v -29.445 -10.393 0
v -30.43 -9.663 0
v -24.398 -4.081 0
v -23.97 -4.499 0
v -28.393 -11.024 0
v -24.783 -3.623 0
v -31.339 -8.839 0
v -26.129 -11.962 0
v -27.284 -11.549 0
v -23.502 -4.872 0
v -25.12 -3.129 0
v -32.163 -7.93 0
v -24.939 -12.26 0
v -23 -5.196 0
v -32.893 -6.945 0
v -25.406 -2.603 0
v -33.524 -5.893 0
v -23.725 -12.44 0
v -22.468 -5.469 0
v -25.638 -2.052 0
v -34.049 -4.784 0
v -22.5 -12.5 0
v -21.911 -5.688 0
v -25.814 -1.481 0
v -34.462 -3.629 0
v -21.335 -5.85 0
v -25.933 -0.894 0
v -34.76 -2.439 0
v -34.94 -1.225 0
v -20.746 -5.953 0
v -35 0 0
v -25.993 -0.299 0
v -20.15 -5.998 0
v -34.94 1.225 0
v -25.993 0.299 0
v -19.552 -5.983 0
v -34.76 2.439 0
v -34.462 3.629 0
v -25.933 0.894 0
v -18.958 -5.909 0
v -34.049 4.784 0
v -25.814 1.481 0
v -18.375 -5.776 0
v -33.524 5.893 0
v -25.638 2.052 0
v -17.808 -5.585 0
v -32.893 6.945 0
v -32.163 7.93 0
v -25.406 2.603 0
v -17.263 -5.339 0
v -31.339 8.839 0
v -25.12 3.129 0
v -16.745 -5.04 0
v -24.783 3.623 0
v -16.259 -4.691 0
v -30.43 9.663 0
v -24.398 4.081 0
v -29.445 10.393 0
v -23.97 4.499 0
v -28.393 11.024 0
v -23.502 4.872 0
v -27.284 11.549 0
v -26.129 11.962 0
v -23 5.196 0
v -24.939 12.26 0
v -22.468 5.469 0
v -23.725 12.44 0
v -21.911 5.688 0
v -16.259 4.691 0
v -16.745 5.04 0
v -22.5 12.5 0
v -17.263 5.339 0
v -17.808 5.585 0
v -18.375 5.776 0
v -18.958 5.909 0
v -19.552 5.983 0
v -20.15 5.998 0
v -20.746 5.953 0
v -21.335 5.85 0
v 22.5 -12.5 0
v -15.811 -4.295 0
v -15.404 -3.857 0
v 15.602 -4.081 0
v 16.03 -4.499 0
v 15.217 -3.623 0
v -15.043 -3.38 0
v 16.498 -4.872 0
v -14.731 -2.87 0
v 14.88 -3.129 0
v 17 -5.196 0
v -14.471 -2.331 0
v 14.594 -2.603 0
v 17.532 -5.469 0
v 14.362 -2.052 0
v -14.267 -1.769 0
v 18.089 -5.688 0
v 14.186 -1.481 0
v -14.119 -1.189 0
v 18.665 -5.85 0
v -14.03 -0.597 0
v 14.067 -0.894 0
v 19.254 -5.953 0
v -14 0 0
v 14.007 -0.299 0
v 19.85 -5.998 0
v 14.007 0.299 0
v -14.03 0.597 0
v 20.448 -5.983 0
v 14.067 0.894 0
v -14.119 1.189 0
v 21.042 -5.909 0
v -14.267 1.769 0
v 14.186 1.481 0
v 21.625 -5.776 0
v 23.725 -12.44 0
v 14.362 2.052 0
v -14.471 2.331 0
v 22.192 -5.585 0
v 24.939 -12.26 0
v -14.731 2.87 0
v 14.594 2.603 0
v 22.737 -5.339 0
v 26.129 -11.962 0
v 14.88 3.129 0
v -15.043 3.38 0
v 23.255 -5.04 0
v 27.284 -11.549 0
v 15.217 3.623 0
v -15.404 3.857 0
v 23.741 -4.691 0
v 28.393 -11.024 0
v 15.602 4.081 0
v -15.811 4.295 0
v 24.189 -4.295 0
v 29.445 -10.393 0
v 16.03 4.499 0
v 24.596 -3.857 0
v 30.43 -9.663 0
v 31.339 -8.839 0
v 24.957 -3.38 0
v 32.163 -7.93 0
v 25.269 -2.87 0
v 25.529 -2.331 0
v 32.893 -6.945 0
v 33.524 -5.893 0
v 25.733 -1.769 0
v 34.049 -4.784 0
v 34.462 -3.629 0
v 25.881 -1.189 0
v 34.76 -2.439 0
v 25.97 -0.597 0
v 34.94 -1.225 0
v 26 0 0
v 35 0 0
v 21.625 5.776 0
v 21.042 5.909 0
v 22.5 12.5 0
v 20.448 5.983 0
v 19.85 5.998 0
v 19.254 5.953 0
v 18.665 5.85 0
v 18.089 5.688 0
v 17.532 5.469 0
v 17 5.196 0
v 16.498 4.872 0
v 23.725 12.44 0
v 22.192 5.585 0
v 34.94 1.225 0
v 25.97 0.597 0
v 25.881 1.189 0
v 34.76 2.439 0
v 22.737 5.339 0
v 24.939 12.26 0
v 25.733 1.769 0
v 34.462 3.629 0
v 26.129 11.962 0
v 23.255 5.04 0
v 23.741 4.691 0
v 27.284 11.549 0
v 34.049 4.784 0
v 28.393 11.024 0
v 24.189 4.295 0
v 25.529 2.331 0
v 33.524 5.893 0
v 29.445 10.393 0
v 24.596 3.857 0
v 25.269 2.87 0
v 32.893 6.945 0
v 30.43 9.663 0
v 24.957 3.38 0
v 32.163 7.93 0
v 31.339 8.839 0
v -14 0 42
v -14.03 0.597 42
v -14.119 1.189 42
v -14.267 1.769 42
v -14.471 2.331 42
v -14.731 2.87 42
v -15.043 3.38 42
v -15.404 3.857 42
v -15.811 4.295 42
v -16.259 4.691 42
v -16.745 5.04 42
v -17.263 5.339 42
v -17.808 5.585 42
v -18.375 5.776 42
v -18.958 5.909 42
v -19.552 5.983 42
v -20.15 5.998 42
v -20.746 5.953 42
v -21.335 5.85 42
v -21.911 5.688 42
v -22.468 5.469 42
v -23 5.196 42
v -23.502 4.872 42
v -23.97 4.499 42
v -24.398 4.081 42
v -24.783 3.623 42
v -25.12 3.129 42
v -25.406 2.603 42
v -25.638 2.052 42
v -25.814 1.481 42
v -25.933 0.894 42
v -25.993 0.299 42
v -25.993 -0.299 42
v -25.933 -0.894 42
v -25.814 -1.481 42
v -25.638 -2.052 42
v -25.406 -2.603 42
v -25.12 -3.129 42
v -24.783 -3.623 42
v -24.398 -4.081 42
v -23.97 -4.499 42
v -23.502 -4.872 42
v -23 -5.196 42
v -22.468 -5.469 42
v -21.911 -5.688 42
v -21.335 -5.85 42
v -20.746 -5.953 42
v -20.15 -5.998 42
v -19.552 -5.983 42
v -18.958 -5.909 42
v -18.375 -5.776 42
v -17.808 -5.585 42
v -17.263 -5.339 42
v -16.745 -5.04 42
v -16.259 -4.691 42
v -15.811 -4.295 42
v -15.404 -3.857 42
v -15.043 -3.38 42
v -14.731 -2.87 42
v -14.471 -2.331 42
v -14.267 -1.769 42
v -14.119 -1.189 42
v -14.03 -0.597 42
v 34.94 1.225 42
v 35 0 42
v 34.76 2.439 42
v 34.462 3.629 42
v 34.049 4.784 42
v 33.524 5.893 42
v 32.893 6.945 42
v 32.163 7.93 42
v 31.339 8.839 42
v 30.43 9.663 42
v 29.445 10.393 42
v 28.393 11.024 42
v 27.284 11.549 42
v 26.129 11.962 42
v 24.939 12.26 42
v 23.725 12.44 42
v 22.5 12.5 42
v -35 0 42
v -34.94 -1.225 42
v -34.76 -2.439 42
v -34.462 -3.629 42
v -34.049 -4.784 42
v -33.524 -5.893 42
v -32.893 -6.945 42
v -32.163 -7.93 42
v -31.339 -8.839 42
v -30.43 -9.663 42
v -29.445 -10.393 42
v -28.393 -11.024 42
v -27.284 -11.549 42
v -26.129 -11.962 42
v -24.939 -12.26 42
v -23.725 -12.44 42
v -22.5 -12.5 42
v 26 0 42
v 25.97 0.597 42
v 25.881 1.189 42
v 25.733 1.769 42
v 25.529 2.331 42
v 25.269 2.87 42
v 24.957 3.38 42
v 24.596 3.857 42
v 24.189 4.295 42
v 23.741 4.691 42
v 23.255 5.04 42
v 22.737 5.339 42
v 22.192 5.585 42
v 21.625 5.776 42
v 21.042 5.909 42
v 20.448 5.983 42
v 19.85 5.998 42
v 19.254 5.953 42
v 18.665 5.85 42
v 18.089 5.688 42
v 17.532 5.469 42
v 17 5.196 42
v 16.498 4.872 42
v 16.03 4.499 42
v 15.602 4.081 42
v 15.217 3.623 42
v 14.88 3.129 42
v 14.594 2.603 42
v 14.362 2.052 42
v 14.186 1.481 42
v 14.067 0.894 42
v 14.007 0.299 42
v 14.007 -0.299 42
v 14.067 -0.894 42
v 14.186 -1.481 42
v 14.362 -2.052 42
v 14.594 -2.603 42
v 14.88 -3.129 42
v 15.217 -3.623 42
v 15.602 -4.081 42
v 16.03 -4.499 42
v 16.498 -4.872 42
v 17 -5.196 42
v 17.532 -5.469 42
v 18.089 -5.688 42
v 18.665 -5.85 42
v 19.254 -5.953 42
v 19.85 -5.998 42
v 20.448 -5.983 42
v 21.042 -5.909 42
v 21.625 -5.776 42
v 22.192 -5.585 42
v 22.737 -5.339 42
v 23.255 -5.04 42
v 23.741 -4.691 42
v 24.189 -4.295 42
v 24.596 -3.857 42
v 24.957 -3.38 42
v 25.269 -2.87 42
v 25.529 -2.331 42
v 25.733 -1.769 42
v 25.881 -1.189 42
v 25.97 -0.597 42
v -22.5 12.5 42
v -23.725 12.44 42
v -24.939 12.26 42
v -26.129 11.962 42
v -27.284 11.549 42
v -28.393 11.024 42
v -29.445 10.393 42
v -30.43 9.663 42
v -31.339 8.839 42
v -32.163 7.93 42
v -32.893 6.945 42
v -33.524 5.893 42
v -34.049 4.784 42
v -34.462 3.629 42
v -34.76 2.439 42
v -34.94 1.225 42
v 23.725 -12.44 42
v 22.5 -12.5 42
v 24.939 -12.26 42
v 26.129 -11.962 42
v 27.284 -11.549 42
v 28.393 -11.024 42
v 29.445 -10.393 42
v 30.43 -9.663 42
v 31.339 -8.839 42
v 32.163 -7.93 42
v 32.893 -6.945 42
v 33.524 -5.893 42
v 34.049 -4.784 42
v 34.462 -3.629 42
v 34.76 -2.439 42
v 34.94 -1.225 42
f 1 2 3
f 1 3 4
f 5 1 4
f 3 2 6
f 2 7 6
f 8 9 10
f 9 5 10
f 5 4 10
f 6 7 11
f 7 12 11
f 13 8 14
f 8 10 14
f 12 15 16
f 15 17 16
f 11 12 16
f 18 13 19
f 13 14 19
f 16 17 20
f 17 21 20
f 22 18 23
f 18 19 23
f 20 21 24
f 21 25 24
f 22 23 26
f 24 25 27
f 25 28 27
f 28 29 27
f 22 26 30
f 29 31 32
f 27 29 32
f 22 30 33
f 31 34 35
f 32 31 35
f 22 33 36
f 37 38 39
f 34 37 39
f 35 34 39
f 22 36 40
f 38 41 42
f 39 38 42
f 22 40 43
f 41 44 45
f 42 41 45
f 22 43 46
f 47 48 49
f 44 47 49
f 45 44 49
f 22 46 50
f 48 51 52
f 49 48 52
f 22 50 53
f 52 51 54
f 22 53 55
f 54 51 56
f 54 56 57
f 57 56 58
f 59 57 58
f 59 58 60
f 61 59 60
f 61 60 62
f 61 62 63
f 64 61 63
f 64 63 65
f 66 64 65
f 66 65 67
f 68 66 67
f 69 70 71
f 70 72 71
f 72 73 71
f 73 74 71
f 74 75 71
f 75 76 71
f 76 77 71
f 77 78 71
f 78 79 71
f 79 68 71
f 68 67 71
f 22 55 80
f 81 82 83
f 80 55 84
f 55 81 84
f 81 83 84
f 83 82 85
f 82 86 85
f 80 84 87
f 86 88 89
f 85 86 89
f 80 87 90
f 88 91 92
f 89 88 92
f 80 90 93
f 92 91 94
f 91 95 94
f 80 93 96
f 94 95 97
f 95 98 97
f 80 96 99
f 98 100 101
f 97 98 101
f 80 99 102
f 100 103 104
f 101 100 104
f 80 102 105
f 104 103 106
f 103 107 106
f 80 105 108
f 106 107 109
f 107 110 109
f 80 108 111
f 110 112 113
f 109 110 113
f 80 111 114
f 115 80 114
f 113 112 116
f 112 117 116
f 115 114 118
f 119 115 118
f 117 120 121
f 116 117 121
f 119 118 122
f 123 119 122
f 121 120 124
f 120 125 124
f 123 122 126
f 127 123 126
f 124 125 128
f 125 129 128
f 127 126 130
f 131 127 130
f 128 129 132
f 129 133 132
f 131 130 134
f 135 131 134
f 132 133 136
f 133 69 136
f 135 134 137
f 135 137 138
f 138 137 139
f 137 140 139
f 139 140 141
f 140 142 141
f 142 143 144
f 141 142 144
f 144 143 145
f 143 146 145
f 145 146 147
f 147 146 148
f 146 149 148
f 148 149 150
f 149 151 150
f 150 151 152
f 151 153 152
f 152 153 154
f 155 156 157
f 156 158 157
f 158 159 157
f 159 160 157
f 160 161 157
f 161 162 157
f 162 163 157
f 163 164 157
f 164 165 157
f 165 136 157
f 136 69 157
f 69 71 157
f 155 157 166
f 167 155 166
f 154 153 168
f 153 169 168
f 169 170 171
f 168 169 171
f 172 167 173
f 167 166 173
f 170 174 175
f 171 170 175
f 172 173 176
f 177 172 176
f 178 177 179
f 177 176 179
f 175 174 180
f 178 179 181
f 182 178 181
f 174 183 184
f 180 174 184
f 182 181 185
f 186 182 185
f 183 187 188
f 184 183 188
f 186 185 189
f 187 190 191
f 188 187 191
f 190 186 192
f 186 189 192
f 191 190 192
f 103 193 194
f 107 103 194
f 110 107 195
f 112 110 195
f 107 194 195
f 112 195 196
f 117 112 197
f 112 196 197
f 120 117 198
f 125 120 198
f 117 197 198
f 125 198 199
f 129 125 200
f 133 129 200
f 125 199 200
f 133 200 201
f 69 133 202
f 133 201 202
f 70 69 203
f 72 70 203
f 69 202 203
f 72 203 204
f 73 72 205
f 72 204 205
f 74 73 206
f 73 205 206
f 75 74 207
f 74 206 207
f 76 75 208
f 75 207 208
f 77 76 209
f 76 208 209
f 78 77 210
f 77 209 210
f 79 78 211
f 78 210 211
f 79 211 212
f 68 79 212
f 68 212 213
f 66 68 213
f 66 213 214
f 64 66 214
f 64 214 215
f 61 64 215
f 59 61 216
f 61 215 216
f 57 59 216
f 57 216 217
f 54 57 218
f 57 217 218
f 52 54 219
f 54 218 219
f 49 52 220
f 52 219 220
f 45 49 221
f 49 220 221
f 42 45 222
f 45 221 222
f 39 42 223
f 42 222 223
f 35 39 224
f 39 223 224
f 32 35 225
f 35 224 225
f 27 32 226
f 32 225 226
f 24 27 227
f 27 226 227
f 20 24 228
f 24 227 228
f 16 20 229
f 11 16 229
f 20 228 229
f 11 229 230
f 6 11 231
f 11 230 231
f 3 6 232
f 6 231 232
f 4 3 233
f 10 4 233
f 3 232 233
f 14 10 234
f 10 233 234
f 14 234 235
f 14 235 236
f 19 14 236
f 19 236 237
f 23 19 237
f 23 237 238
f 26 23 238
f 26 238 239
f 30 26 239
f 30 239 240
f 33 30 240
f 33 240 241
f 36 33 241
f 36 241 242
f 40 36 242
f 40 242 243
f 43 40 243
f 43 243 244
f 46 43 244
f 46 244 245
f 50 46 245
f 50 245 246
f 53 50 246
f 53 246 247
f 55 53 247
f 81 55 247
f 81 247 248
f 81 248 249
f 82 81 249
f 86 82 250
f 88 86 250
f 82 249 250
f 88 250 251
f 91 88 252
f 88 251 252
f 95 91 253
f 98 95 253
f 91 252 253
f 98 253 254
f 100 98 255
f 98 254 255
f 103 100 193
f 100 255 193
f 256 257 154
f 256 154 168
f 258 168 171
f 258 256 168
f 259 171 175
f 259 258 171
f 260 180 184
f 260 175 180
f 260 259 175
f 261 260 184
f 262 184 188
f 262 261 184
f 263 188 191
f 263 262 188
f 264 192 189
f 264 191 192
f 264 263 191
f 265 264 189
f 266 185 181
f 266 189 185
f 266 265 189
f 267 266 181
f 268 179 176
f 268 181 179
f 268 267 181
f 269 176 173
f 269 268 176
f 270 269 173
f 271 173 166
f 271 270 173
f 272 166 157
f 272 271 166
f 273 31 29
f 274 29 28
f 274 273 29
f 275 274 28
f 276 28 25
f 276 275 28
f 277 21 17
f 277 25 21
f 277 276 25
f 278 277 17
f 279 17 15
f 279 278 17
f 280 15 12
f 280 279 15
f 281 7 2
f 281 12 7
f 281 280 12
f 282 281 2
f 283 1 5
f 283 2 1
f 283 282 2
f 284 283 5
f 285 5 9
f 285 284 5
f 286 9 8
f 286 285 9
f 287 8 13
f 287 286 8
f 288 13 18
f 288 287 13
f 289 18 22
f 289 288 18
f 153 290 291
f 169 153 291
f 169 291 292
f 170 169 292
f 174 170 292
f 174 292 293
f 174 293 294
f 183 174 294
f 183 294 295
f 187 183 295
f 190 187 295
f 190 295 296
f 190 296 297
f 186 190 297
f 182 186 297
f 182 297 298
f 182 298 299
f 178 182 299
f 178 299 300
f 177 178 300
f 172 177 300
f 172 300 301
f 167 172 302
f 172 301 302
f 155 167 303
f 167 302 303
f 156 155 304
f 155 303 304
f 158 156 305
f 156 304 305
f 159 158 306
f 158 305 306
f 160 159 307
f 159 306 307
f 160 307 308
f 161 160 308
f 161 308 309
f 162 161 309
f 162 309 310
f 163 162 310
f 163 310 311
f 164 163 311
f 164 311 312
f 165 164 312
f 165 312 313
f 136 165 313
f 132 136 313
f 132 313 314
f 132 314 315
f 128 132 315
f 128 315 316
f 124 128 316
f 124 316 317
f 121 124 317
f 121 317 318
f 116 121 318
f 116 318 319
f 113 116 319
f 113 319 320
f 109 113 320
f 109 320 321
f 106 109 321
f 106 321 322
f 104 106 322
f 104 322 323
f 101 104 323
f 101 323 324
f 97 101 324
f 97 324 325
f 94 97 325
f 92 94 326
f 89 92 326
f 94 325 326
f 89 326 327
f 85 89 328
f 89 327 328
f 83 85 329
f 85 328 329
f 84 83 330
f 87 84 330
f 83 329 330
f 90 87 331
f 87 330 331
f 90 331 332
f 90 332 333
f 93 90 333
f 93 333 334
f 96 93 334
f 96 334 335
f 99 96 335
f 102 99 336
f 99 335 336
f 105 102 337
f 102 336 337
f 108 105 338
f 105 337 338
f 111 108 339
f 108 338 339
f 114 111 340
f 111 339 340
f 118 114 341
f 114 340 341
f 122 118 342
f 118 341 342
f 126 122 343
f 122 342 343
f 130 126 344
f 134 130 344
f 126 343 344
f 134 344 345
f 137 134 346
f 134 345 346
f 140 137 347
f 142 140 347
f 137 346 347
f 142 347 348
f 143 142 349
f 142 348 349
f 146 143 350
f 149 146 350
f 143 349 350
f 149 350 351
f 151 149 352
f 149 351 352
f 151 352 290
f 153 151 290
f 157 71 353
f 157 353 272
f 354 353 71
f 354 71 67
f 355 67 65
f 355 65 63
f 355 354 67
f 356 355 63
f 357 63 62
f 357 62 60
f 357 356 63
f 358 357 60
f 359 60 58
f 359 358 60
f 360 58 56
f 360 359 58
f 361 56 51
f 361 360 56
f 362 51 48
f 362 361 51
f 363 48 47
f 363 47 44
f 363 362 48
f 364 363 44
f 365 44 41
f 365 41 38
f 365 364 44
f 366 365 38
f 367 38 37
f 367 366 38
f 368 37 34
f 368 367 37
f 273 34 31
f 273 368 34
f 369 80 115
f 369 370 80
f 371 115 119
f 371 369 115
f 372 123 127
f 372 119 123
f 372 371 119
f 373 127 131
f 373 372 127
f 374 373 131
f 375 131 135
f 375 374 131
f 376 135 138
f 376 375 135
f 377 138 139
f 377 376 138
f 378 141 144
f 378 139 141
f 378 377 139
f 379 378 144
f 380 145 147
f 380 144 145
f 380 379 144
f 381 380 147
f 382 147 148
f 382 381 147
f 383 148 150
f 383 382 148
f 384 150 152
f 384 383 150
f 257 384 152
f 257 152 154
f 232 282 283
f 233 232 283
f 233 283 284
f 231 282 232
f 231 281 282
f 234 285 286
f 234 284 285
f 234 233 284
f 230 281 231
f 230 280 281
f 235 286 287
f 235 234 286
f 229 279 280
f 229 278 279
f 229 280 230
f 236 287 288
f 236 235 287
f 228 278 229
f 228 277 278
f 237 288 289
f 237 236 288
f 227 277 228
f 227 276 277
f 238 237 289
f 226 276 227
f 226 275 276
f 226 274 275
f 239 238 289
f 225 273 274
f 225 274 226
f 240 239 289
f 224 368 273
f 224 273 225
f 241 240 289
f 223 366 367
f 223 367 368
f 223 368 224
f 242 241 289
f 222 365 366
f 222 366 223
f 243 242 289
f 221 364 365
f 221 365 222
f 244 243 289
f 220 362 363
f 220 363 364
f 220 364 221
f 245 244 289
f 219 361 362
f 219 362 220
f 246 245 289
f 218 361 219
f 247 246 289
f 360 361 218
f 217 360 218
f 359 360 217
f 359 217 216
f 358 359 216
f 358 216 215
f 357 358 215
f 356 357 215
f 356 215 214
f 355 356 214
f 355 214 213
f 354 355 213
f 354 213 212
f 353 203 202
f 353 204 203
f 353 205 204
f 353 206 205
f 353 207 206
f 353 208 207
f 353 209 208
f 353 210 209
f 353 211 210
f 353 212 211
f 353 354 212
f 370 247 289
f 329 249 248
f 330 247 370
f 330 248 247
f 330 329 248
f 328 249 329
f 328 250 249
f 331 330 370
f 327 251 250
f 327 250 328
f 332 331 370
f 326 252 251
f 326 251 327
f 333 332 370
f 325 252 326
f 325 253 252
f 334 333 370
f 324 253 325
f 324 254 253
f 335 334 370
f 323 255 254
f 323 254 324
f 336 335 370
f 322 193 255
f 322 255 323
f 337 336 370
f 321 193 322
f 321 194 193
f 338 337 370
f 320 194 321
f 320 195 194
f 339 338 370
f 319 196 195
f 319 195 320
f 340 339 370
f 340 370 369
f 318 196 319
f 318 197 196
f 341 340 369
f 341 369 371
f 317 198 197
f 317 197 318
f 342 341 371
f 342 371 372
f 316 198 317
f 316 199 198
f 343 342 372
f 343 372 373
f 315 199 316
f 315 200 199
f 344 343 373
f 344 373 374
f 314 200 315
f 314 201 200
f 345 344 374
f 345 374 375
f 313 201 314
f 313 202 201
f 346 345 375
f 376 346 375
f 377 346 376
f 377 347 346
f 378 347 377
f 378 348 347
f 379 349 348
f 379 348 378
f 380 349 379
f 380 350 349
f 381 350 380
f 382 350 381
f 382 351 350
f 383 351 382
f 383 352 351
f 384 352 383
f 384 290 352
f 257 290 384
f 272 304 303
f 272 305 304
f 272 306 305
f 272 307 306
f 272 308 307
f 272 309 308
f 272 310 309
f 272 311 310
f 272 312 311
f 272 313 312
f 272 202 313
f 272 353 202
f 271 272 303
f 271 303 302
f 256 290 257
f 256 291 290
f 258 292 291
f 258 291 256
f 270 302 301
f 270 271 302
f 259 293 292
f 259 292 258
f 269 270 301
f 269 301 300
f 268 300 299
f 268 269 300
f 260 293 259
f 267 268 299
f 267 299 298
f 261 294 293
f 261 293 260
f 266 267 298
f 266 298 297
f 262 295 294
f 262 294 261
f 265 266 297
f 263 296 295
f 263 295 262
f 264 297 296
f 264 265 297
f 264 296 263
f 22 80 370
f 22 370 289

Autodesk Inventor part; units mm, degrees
ref_plane "YZ Plane" through (0, 0, 0) normal (1, 0, 0) x (0, 1, 0)
ref_plane "XZ Plane" through (0, 0, 0) normal (0, 1, 0) x (-1, 0, 0)
ref_plane "XY Plane" through (0, 0, 0) normal (0, 0, 1) x (1, 0, 0)
sketch "Sketch1" plane through (0, 0, 0) normal (0, 0, 1) x (1, 0, 0)
  line L0 (-35, 12.5) -> (35, 12.5)
  line L1 (35, 12.5) -> (35, -12.5)
  line L2 (35, -12.5) -> (-35, -12.5)
  line L3 (-35, -12.5) -> (-35, 12.5)
  point P0 (0, 0)
  dimension "d0" = 70
  dimension "d1" = 25
  dimension "d2" = 35
  dimension "d3" = 12.5
extrude "Extrusion1" add sketch "Sketch1" along normal blind 42
full round fillet "Full Round Fillet1" first side at (11.6667, 12.5, 14) centre faces at (-35, 4.1667, 14) second side at (-11.6667, -12.5, 14)
full round fillet "Full Round Fillet2" first side at (15.8333, 12.5, 14) centre faces at (35, -4.1667, 14) second side at (-3.3334, -12.5, 28)
sketch "Sketch2" plane through (0, 0, 42) normal (0, 0, 1) x (1, 0, 0)
  circle A0 centre (-20, 0) radius 6
  circle A1 centre (20, 0) radius 6
  point P0 (0, 0)
  dimension "d6" = 12
  dimension "d7" = 12
  dimension "d8" = 40
  dimension "d9" = 20
extrude "Extrusion2" cut sketch "Sketch2" against normal blind 42
thread "Thread1" size "M12x1.75" class "6H" standard "ANSI Metric M Profile" full length
thread "Thread2" size "M12x1.75" class "6H" standard "ANSI Metric M Profile" full length
properties part number "Topo Macaco" material "Steel ASTM A36"
